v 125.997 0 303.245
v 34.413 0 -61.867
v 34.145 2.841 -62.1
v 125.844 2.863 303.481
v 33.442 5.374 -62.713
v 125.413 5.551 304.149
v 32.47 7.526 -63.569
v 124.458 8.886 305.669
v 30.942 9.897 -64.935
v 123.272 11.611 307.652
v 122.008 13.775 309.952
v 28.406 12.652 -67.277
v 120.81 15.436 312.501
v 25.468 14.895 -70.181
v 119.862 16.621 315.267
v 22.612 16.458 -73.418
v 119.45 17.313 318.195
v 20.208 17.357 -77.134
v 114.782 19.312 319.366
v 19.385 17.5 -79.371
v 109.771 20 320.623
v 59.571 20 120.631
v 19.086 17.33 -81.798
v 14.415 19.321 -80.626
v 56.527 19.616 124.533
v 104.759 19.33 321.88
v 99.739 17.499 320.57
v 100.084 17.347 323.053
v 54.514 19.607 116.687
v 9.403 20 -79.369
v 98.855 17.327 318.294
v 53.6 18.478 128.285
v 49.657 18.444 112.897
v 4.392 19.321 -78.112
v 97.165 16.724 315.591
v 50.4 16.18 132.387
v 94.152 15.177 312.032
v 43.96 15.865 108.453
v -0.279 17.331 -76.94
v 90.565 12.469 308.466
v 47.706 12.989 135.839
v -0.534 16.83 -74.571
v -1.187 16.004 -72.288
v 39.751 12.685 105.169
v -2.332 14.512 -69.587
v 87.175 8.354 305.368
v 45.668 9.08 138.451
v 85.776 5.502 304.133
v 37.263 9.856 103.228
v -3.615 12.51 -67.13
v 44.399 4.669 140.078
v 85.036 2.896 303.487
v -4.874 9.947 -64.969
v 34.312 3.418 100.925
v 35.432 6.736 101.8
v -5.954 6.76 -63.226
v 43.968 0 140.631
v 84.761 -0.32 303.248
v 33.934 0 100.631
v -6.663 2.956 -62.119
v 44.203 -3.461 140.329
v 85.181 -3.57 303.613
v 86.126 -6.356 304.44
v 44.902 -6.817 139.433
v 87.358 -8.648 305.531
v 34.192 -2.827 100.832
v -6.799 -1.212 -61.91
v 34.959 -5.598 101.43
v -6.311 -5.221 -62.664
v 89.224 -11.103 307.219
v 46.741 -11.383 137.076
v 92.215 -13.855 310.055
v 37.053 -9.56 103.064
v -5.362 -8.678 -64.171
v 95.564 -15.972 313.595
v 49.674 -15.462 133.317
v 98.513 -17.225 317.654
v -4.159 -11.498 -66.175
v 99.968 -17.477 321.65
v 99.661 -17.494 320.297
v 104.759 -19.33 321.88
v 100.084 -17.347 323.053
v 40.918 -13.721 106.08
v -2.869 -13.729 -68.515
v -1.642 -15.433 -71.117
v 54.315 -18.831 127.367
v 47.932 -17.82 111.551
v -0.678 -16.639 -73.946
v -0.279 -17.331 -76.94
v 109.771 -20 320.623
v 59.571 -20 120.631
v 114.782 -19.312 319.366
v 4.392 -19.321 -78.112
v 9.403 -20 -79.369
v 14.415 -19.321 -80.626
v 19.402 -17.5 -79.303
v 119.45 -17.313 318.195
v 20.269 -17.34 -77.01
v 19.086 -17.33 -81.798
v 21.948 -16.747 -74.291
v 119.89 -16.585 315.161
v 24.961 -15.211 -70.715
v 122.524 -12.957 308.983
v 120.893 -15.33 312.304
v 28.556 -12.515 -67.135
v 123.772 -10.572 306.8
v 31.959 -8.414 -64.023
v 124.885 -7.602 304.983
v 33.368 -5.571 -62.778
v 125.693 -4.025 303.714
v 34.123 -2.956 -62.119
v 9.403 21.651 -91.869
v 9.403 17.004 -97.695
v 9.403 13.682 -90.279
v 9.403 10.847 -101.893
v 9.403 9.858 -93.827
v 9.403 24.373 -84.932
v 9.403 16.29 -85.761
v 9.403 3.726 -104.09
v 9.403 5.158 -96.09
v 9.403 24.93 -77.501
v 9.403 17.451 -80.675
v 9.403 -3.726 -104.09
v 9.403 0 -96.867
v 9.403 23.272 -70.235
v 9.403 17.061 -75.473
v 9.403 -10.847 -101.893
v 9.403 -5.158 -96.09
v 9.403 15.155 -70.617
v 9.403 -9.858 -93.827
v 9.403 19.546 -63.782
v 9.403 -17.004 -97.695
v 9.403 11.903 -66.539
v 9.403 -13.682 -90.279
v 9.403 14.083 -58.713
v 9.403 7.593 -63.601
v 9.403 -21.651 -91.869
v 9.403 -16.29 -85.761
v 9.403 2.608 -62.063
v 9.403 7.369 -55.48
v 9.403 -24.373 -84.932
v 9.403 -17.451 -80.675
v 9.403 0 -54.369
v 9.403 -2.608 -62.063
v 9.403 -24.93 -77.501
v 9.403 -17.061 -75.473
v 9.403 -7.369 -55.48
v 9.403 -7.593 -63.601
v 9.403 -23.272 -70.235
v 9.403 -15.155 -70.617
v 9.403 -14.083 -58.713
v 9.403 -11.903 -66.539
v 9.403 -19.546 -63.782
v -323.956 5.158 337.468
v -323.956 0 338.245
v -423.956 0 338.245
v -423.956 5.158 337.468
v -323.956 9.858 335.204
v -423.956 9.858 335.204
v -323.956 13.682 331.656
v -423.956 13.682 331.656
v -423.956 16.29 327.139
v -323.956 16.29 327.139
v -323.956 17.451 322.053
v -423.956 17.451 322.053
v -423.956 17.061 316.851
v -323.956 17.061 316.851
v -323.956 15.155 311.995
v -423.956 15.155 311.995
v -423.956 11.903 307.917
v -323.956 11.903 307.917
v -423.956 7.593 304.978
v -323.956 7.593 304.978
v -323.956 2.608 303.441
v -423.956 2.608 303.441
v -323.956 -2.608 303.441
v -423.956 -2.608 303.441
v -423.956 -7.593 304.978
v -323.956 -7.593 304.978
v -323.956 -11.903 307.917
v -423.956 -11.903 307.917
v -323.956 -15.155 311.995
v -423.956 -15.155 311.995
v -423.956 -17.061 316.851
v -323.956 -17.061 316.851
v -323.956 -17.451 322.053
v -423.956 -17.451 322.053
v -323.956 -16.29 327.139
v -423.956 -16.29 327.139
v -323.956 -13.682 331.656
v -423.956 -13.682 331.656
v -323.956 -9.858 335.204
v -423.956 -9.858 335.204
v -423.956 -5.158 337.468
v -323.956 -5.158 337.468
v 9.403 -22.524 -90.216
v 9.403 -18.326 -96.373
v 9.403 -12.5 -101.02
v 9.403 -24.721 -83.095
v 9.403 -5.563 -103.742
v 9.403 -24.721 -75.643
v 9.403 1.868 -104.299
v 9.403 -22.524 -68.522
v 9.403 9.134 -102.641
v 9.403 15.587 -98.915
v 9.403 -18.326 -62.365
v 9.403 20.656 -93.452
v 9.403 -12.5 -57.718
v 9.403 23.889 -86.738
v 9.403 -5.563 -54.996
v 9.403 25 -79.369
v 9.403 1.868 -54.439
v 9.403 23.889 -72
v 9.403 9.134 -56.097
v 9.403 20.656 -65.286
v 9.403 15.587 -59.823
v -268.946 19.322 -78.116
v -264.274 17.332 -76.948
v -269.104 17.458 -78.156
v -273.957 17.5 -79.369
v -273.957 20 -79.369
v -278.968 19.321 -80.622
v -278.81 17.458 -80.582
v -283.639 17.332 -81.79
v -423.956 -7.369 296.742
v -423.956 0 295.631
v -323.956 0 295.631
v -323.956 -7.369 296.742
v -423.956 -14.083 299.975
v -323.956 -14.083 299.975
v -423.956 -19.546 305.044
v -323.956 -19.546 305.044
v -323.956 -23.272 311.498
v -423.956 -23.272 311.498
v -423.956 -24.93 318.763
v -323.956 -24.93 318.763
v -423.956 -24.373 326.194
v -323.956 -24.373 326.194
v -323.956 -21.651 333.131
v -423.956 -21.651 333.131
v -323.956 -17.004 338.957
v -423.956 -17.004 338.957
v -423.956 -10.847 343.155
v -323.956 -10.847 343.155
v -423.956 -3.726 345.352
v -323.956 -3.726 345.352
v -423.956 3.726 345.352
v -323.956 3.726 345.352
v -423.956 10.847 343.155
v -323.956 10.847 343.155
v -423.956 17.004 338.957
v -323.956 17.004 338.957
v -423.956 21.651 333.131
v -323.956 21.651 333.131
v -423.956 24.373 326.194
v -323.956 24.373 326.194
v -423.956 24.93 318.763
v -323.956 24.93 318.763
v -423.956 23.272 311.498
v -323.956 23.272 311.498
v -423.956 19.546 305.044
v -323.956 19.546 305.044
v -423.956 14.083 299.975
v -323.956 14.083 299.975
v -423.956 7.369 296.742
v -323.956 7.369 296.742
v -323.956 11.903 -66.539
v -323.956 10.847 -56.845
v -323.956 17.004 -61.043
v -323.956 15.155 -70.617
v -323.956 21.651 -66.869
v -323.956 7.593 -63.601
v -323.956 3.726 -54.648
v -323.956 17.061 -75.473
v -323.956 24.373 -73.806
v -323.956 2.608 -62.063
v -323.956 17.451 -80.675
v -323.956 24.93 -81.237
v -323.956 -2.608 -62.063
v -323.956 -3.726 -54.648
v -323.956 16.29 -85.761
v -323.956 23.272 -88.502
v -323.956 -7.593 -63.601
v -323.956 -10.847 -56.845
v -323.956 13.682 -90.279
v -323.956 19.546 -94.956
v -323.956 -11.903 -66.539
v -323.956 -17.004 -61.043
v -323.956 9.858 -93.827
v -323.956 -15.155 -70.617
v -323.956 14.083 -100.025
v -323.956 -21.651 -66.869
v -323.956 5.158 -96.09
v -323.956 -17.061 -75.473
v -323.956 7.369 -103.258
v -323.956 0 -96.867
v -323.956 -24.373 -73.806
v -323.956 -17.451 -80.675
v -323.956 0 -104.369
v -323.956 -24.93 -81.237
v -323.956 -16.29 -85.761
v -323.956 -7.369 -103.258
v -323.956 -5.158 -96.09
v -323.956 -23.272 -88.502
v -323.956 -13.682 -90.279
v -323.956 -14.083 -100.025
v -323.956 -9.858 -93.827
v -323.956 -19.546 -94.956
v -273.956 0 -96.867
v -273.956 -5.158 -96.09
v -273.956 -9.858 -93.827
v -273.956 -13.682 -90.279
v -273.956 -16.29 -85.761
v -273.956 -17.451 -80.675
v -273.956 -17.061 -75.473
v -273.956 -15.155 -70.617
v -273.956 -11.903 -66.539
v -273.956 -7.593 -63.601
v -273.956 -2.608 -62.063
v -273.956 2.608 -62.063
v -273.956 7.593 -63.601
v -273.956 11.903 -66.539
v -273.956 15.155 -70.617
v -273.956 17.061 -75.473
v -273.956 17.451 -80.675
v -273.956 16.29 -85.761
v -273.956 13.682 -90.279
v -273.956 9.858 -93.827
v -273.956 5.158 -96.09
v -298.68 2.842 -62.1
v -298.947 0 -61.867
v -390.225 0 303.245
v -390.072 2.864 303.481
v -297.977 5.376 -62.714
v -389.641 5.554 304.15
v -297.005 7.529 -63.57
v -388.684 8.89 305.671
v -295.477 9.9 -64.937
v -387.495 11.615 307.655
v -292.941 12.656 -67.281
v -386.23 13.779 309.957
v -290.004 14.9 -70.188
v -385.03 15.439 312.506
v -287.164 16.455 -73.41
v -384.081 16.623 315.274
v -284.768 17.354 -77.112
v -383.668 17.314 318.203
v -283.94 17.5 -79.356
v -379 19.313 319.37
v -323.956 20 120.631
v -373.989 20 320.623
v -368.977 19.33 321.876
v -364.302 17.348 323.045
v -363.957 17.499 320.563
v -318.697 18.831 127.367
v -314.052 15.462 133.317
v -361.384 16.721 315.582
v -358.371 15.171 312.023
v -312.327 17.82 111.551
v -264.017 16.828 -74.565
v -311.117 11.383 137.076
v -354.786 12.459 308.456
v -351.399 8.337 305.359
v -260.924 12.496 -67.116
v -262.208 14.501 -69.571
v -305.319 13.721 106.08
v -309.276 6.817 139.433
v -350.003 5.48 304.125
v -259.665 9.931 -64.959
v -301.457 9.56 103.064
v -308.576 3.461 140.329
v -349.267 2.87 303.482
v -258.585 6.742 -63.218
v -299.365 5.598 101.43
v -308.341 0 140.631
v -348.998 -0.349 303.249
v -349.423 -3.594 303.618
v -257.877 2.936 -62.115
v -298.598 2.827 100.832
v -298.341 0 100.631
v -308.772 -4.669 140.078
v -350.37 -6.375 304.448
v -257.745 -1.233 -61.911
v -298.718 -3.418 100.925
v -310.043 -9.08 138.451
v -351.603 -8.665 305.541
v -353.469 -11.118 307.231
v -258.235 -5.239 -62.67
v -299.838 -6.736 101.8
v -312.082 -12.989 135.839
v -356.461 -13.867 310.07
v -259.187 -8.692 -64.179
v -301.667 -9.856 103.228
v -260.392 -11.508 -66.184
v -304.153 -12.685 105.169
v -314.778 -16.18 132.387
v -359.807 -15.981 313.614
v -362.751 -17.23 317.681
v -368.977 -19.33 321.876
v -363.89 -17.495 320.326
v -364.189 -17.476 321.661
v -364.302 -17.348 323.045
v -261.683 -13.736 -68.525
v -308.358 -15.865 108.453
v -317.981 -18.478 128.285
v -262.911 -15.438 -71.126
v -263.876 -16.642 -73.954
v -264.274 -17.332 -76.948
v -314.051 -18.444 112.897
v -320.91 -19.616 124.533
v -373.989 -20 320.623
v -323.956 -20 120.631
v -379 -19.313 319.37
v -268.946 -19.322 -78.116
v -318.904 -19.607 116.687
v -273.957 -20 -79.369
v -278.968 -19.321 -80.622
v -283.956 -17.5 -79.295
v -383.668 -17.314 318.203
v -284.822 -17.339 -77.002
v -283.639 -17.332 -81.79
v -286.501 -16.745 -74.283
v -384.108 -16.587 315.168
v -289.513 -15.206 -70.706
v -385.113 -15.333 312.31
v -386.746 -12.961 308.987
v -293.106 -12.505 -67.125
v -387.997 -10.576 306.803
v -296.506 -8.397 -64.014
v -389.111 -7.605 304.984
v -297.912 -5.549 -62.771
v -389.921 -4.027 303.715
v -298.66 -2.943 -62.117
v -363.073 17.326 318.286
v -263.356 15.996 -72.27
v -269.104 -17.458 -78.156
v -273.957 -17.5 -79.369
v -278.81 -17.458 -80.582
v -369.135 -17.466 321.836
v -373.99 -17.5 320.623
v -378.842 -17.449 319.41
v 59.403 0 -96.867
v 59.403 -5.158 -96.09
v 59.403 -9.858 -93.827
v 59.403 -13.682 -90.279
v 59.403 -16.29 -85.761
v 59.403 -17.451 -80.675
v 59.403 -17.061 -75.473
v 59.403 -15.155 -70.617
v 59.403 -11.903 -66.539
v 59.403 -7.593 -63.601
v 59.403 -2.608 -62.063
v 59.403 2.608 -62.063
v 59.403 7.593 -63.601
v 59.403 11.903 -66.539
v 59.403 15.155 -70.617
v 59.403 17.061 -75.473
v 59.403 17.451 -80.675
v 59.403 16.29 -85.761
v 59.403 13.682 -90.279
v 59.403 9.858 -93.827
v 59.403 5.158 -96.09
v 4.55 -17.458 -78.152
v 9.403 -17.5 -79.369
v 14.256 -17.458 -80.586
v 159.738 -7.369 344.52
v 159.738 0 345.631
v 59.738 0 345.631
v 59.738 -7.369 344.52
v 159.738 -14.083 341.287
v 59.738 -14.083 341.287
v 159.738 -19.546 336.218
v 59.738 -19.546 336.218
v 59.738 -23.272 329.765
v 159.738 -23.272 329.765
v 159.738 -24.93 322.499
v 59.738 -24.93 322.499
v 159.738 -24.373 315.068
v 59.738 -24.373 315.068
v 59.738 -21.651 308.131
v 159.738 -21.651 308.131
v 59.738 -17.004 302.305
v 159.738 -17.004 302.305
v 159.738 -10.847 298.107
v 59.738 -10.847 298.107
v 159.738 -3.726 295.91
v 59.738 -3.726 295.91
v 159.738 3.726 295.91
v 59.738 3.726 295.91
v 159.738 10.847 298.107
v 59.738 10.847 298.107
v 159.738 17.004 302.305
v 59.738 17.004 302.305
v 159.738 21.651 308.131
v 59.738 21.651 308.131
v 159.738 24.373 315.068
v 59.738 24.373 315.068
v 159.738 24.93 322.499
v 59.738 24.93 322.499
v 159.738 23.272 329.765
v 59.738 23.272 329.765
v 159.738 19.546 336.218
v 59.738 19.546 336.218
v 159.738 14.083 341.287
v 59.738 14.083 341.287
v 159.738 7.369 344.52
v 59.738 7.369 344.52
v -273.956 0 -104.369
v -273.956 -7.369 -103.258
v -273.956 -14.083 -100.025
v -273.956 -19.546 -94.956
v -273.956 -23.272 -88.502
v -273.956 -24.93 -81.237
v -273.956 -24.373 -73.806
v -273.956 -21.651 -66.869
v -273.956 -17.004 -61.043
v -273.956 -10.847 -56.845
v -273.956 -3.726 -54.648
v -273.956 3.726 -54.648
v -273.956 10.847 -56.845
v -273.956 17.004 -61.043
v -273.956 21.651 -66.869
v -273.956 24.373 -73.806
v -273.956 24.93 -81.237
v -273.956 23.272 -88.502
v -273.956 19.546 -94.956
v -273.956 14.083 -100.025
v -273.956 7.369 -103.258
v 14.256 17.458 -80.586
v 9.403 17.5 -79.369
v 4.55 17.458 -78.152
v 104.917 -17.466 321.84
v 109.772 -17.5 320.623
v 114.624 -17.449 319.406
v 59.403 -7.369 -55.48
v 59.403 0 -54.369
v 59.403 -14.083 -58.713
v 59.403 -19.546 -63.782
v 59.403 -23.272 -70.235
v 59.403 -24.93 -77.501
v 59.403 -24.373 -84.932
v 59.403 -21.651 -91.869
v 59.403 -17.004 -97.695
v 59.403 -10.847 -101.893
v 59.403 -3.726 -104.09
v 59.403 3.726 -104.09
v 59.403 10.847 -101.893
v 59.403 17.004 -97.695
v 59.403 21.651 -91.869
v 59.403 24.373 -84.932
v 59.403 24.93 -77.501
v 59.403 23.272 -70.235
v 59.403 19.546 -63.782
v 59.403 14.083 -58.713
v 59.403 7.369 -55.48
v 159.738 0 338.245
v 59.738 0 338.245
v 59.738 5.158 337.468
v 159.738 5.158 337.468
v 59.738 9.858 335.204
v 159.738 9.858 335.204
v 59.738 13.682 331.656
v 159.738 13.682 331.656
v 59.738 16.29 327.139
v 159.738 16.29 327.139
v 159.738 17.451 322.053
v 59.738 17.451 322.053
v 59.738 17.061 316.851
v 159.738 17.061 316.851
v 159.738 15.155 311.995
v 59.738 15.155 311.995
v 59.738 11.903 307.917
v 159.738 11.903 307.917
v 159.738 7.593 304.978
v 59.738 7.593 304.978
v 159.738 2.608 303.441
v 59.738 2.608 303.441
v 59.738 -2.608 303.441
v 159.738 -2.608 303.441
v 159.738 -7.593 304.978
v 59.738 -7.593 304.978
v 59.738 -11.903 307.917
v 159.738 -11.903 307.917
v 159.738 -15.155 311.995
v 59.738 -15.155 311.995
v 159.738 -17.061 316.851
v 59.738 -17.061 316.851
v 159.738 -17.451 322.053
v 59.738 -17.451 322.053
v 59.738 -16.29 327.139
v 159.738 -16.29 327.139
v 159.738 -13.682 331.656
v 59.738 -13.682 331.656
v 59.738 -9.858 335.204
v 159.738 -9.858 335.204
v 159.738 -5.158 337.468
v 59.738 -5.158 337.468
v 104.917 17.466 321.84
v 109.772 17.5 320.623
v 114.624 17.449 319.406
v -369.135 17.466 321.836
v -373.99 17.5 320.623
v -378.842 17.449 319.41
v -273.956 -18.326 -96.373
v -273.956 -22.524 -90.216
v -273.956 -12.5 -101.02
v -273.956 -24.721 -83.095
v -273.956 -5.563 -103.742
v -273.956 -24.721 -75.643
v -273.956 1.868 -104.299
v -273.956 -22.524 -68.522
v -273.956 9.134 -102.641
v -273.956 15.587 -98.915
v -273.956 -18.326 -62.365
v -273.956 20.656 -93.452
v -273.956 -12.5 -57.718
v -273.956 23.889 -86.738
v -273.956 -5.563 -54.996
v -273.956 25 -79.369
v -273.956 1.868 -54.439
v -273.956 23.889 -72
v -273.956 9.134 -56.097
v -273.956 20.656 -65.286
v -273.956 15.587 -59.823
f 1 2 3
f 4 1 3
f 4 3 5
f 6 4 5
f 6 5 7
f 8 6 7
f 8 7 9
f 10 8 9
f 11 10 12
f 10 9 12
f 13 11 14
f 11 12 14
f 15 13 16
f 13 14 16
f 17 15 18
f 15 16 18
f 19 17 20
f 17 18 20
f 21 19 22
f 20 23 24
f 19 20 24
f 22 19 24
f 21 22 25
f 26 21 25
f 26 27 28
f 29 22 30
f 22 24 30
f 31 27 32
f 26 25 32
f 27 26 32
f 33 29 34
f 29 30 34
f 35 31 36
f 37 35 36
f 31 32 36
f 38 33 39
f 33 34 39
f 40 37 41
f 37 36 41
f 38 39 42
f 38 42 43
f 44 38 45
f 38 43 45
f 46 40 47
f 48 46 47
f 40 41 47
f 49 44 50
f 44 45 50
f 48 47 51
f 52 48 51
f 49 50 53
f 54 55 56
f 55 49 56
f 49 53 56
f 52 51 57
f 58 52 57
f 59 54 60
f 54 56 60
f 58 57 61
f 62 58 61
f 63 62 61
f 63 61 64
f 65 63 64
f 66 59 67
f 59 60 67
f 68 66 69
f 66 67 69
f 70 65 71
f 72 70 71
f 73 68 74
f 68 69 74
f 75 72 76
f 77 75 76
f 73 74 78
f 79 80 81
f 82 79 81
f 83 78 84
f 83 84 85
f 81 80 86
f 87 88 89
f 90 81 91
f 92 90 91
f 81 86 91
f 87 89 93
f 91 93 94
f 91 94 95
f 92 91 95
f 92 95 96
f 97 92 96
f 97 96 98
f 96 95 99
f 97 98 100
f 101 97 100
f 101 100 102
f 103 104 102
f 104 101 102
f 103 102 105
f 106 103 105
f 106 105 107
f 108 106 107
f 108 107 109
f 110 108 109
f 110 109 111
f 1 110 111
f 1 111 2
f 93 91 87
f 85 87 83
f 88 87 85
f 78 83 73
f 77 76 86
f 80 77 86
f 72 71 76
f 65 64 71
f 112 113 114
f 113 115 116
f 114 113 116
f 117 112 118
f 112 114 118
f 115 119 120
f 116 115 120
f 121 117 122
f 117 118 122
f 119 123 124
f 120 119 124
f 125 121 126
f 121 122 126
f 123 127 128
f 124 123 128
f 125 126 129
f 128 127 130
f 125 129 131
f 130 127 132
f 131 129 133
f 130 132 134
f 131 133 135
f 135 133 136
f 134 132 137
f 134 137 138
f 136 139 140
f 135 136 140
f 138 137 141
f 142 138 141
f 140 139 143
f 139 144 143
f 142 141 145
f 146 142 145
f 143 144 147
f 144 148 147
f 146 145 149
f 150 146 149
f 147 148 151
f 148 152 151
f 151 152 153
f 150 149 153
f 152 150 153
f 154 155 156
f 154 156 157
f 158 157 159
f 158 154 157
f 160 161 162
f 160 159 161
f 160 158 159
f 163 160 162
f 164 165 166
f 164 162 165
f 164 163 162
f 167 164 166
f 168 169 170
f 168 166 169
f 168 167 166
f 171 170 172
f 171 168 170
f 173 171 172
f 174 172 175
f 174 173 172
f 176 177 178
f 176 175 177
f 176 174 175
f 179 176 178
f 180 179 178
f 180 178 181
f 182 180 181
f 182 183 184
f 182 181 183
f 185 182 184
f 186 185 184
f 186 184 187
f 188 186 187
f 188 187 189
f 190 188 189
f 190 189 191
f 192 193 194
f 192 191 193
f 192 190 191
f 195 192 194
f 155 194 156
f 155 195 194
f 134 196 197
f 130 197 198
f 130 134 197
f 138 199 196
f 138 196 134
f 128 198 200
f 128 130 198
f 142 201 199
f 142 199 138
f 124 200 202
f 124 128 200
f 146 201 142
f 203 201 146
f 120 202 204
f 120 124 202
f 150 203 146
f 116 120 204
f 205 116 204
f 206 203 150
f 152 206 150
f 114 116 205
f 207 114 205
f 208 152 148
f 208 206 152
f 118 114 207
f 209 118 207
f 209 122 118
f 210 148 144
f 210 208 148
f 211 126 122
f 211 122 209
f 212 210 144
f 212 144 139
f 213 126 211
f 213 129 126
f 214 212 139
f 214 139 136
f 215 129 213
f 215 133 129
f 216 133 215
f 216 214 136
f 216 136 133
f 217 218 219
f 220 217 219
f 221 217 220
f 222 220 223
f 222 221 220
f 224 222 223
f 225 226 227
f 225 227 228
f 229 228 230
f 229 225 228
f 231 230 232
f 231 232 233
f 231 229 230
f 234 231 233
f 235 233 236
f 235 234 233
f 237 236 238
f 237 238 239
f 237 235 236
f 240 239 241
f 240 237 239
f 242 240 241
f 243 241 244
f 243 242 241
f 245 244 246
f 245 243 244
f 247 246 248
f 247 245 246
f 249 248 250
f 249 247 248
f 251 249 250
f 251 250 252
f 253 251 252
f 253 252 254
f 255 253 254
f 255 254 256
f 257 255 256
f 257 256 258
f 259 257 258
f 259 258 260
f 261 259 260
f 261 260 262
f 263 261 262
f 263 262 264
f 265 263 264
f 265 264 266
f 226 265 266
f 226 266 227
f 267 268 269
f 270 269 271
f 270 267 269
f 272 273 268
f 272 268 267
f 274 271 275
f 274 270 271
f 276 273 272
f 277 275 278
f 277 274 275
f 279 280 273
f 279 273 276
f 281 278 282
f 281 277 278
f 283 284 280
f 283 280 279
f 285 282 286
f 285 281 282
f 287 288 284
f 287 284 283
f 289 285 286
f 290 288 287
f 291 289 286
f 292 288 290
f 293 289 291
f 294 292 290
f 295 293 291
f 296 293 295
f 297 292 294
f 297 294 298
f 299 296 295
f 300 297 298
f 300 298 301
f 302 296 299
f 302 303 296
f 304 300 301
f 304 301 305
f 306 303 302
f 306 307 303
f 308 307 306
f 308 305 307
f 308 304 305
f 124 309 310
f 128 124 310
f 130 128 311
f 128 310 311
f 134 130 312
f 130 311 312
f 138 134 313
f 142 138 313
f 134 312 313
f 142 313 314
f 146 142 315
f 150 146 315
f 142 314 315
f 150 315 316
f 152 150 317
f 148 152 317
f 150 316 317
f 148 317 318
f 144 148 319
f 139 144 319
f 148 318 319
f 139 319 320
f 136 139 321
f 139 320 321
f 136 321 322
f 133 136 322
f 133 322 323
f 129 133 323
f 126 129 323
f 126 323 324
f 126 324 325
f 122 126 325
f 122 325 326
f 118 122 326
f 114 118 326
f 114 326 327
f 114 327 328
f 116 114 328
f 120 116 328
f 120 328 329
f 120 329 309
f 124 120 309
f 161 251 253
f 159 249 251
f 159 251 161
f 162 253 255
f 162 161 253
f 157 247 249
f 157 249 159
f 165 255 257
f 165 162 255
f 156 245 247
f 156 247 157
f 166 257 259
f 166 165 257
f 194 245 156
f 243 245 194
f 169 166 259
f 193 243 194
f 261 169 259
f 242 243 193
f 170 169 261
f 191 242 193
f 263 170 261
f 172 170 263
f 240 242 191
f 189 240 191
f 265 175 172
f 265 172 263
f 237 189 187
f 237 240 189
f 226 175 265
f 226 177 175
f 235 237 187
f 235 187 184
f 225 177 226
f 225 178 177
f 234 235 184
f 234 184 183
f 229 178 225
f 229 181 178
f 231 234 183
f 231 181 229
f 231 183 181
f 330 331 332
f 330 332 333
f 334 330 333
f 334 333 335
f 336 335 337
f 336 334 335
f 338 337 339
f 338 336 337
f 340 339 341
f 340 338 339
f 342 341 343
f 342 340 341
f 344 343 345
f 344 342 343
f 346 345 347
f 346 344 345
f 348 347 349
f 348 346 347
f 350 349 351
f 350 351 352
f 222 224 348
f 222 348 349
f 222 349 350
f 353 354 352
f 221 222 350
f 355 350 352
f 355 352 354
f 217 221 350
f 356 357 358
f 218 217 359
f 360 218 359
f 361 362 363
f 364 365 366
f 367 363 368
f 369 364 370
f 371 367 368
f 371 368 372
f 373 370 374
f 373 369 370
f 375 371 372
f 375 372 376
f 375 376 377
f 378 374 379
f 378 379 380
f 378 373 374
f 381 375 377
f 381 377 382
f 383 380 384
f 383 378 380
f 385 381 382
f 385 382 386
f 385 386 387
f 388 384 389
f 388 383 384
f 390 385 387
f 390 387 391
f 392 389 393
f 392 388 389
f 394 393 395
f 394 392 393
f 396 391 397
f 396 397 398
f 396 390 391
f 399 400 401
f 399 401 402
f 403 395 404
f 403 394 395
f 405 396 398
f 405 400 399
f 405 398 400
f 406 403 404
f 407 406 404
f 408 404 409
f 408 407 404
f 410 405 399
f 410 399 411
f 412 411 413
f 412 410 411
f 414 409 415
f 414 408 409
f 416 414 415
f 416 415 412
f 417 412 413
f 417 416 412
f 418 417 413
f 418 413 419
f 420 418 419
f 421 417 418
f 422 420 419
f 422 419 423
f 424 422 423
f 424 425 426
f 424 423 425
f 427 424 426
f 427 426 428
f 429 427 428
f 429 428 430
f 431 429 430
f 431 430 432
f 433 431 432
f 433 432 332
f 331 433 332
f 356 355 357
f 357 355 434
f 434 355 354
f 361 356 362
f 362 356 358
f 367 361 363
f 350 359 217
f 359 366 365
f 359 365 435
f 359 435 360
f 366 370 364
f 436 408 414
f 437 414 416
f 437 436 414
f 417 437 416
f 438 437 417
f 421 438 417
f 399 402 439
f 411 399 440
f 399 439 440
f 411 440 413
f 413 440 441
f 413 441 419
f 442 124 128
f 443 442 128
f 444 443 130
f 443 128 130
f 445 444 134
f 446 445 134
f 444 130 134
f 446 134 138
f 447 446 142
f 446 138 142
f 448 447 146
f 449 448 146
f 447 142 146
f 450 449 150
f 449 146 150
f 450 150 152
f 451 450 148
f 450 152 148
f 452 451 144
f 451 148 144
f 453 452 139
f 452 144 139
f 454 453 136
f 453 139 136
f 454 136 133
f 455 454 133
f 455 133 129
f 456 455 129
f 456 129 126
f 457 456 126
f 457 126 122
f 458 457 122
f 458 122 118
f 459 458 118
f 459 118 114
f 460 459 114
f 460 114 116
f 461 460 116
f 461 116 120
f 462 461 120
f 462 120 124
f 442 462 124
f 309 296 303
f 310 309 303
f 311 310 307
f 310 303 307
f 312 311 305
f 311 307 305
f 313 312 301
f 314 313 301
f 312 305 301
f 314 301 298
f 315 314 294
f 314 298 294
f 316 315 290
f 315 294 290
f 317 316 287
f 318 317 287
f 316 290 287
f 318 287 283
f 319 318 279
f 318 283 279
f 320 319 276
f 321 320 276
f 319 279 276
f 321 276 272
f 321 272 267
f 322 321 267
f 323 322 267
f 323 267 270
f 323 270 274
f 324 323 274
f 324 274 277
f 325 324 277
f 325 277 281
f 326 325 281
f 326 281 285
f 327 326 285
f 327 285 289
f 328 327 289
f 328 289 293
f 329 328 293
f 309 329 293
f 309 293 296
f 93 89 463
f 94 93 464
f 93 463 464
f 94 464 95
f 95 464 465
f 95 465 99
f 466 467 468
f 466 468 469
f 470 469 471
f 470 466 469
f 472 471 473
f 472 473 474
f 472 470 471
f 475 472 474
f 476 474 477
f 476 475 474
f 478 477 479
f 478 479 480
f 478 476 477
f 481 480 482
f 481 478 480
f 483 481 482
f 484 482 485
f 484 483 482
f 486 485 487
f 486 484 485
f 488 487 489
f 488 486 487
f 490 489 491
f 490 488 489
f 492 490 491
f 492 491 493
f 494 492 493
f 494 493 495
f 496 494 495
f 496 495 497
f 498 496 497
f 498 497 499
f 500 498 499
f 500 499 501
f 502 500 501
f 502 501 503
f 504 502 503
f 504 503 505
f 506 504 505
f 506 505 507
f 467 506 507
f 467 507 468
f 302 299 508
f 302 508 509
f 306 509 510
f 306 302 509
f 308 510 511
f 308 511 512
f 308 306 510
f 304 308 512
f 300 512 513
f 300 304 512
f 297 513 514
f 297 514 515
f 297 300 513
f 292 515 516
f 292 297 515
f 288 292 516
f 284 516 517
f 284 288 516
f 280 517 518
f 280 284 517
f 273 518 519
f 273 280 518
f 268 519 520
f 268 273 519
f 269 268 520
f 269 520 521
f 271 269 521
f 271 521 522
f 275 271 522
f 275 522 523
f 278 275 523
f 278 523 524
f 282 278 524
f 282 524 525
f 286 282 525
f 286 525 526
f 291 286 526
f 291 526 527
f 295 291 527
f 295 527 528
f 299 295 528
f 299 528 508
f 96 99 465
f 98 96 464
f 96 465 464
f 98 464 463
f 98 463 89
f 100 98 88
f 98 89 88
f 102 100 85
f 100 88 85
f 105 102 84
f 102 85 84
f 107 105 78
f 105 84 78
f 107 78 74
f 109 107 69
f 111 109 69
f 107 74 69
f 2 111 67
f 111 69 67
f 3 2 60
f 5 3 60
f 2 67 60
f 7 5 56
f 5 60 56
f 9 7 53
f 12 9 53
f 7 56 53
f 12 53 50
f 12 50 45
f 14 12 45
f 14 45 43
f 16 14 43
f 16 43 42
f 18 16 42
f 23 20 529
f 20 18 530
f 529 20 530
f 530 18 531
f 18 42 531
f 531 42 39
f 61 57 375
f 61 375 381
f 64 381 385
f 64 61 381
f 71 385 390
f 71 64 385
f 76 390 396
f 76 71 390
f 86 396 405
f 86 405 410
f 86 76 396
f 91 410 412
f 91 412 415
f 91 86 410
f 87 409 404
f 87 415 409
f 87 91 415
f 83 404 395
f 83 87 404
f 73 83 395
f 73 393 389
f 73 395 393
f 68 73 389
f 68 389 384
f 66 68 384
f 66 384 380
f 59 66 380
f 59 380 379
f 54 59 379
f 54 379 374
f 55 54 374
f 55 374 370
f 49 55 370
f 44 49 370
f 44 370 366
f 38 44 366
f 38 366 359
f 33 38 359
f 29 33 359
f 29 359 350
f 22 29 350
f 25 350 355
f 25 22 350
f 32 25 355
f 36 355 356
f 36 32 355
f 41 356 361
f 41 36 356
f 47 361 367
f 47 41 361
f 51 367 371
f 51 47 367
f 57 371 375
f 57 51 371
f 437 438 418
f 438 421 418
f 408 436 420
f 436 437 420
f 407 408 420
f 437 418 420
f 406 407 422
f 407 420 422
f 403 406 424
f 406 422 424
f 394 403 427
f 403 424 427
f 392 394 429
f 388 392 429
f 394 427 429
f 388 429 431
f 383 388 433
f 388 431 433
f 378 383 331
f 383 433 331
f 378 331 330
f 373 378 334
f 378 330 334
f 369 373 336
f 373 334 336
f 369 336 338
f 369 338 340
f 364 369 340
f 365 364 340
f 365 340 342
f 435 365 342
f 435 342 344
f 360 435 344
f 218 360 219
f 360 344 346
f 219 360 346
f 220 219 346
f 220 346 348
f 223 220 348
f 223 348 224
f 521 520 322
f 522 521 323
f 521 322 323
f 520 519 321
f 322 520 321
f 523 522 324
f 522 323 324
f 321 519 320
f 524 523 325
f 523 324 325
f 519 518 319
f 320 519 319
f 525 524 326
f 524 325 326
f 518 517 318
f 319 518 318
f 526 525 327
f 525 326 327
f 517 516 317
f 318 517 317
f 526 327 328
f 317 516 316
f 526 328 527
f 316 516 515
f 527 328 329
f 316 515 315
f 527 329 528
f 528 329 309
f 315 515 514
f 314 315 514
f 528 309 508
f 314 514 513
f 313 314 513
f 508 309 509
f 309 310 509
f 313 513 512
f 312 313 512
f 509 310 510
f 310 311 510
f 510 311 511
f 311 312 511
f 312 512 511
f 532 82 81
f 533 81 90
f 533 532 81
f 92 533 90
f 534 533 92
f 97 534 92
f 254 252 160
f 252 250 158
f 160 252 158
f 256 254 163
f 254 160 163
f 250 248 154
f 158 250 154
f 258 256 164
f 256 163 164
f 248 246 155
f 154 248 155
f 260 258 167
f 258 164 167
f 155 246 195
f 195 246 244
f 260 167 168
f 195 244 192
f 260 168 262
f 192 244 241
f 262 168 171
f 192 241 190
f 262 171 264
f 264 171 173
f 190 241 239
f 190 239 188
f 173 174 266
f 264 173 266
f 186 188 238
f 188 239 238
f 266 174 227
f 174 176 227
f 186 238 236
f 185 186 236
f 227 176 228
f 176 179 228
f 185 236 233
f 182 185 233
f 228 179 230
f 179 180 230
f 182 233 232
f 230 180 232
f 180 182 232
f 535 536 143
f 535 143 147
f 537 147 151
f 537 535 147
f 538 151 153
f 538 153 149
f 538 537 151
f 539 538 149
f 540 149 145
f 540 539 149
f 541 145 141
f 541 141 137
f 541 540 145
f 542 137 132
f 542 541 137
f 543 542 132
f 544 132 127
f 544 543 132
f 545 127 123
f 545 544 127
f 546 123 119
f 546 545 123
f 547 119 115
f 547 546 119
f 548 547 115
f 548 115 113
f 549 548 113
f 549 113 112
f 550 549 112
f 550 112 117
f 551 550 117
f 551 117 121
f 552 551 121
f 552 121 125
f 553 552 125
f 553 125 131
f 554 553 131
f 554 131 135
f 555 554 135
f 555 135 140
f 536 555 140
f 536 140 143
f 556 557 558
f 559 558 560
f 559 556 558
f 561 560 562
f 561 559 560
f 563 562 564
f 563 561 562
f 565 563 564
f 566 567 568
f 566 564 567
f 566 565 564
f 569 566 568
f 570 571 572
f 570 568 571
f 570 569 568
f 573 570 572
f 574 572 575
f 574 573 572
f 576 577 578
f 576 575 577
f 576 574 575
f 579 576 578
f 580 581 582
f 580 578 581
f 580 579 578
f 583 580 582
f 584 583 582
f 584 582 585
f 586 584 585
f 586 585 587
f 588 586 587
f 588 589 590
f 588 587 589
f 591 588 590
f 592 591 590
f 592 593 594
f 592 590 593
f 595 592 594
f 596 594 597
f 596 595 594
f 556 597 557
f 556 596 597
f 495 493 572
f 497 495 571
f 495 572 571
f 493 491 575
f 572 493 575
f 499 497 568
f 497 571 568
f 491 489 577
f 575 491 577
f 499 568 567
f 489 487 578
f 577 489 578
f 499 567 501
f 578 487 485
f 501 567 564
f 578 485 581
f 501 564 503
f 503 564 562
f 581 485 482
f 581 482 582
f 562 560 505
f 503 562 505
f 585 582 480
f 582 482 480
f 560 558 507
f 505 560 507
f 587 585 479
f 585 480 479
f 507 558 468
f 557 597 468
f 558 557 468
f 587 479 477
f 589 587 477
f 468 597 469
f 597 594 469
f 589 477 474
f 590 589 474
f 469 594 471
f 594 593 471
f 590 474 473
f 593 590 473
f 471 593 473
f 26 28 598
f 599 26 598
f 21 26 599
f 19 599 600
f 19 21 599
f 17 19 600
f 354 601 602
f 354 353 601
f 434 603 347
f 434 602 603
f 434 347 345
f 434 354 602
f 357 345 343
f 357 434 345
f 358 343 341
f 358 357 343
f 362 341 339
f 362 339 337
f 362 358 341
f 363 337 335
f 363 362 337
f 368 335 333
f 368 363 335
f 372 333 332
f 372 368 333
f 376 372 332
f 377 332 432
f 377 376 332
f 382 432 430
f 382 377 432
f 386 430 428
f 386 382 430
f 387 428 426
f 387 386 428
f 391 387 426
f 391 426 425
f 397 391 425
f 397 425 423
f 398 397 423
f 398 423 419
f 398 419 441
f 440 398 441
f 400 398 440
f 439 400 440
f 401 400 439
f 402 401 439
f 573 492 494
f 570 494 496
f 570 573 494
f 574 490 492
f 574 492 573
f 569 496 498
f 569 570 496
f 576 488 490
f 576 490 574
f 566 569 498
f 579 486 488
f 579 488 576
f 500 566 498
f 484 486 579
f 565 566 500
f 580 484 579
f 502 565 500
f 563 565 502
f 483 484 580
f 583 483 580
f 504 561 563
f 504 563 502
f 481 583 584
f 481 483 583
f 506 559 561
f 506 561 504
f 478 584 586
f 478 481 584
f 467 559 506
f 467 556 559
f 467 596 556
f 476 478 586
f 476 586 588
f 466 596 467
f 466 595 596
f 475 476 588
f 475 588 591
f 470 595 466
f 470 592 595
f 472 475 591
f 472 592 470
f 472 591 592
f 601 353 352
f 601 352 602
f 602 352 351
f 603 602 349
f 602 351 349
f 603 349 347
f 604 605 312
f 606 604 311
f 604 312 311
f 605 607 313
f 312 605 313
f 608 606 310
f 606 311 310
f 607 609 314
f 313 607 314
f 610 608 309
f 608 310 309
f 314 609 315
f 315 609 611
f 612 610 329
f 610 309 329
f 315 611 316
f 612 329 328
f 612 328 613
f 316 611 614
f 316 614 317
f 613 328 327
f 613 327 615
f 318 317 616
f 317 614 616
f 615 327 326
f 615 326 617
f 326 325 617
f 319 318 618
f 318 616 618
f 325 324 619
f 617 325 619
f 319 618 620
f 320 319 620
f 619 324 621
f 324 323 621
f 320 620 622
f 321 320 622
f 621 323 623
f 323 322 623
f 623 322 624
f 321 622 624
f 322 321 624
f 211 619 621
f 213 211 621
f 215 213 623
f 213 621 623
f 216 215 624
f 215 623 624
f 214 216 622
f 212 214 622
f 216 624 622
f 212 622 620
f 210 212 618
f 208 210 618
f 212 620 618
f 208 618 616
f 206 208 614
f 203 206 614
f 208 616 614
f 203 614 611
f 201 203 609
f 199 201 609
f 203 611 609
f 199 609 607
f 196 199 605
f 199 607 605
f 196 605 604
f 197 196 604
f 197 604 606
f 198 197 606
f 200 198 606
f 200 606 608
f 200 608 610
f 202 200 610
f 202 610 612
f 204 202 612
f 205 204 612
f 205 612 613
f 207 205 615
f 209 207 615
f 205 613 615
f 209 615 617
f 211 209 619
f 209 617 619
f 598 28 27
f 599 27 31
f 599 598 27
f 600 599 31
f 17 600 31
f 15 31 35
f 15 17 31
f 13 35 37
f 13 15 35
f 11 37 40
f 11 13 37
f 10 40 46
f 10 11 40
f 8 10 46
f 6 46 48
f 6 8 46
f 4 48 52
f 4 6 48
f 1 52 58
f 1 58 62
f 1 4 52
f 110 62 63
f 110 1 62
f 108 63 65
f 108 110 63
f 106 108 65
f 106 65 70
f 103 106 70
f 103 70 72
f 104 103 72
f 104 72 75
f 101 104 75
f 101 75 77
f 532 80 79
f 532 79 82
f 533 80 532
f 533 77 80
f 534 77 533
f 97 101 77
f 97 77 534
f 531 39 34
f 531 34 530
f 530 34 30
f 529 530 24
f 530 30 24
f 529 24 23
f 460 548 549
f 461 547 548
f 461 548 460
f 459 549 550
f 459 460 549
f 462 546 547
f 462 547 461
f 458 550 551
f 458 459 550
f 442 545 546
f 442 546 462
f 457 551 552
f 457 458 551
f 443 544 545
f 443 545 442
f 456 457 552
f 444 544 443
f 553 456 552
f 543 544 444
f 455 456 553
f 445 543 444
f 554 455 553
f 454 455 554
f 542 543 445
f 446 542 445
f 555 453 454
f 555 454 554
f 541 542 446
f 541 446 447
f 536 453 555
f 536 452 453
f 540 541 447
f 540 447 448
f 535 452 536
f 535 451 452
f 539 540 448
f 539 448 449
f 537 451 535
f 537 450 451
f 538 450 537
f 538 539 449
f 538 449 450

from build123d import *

# Parameters (mm, degrees)
SWEEP1_PROFILE_R        = 20
SWEEP2_START            = -74.696203031
SWEEP2_OUTLINE_R        = 20
SWEEP2_DEPTH            = 412.392012033
SWEEP3_PROFILE_R        = 20
SWEEP4_PROFILE_R        = 25
SWEEP5_PROFILE_R        = 25
SWEEP6_START            = -273.956371512
SWEEP6_OUTLINE_R        = 25
SWEEP6_DEPTH            = 283.359378358
SWEEP7_PROFILE_R        = 25
SWEEP8_PROFILE_R        = 25
CUT_EXTRUDE1_DEPTH      = 10
CUT_EXTRUDE1_DEPTH_BACK = 583.694674
SKETCH110_R             = 17.5
SKETCH127_R             = 17.5
CUT_EXTRUDE2_DEPTH      = 510


# Read off the part's stored shape, not the designer's step: Sweep2, Sweep6
with BuildPart() as part:
    # Sweep1: sweep along a path in Lower wishbone
    with BuildLine(Plane(origin=(0, 0, 0), x_dir=(1, 0, 0), z_dir=(0, 1, 0))) as sweep1_path:
        Line((-373.956371512, -320.631072668), (-273.956371512, 79.368927332))
    # Sweep1 profile (on start of the path) → Sweep1 (sweep)
    with BuildSketch(Plane(origin=(-373.956371512, 0, 320.631072668), x_dir=(-0.9701425001453319, 0, -0.2425356250363329), z_dir=(0.2425356250363329, 0, -0.9701425001453319))):
        Circle(SWEEP1_PROFILE_R)
    sweep(path=sweep1_path.line)



with BuildPart() as body_2:
    # Sweep2 outline → Sweep2 (new body)
    with BuildSketch(Plane(origin=(0, 0, 0), x_dir=(0.9699508921808406, 0, -0.24330077426426597), z_dir=(0.24330077426426594, 0, 0.9699508921808407)).offset(SWEEP2_START)):
        with Locations((28.430976352, 0)):
            Circle(SWEEP2_OUTLINE_R)
    extrude(amount=SWEEP2_DEPTH)


with BuildPart() as part_1:
    add(part.part)

    add(body_2.part)  # Sweep3 merges body 2
    # Sweep3: sweep along a path in Lower wishbone<7>
    with BuildLine(Plane(origin=(0, 0, 0), x_dir=(1, 0, 0), z_dir=(0, 1, 0))) as sweep3_path:
        Line((-323.956371512, -120.631072668), (59.57065476, -120.631072668))
    # Sweep3 profile (on start of the path) → Sweep3 (sweep)
    with BuildSketch(Plane(origin=(-323.956371512, 0, 120.631072668), x_dir=(0, 0, 1), z_dir=(1, 0, 0))):
        Circle(SWEEP3_PROFILE_R)
    sweep(path=sweep3_path.line)


with BuildPart() as body_2_2:
    # Sweep4: sweep along a path in Lower wishbone<8>
    with BuildLine(Plane(origin=(0, 0, 0), x_dir=(1, 0, 0), z_dir=(0, 1, 0))) as sweep4_path:
        Line((59.738302674, -320.631072668), (159.738302674, -320.631072668))
    # Sweep4 profile (on start of the path) → Sweep4 (sweep)
    with BuildSketch(Plane(origin=(59.738302674, 0, 320.631072668), x_dir=(0, 0, 1), z_dir=(1, 0, 0))):
        Circle(SWEEP4_PROFILE_R)
    sweep(path=sweep4_path.line)


with BuildPart() as body_3:
    # Sweep5: sweep along a path in Lower wishbone<9>
    with BuildLine(Plane(origin=(0, 0, 0), x_dir=(1, 0, 0), z_dir=(0, 1, 0))) as sweep5_path:
        Line((-323.956371512, -320.631072668), (-423.956371512, -320.631072668))
    # Sweep5 profile (on start of the path) → Sweep5 (sweep)
    with BuildSketch(Plane(origin=(-323.956371512, 0, 320.631072668), x_dir=(0, 0, -1), z_dir=(-1, 0, 0))):
        Circle(SWEEP5_PROFILE_R)
    sweep(path=sweep5_path.line)


with BuildPart() as body_4:
    # Sweep6 outline → Sweep6 (new body)
    with BuildSketch(Plane.YZ.offset(SWEEP6_START)):
        with Locations((0, -79.368927332)):
            Circle(SWEEP6_OUTLINE_R)
    extrude(amount=SWEEP6_DEPTH)


with BuildPart() as body_5:
    # Sweep7: sweep along a path in Lower wishbone<11>
    with BuildLine(Plane(origin=(0, 0, 0), x_dir=(1, 0, 0), z_dir=(0, 1, 0))) as sweep7_path:
        Line((-273.956371512, 79.368927332), (-323.956371512, 79.368927332))
    # Sweep7 profile (on start of the path) → Sweep7 (sweep)
    with BuildSketch(Plane(origin=(-273.956371512, 0, -79.368927332), x_dir=(0, 0, -1), z_dir=(-1, 0, 0))):
        Circle(SWEEP7_PROFILE_R)
    sweep(path=sweep7_path.line)


with BuildPart() as body_6:
    # Sweep8: sweep along a path in Lower wishbone<12>
    with BuildLine(Plane(origin=(0, 0, 0), x_dir=(1, 0, 0), z_dir=(0, 1, 0))) as sweep8_path:
        Line((9.403006846, 79.368927332), (59.403006846, 79.368927332))
    # Sweep8 profile (on start of the path) → Sweep8 (sweep)
    with BuildSketch(Plane(origin=(9.403006846, 0, -79.368927332), x_dir=(0, 0, 1), z_dir=(1, 0, 0))):
        Circle(SWEEP8_PROFILE_R)
    sweep(path=sweep8_path.line)


with BuildPart() as cut_extrude1_tool:
    # Sketch110 → Cut-Extrude1 (new, two sides: drawn at the far end of the back side and taken through both)
    with BuildSketch(Plane.ZY.offset(423.956371512).offset(-CUT_EXTRUDE1_DEPTH_BACK)):
        with Locations((320.745233447, 0)):
            Circle(SKETCH110_R)
    extrude(amount=CUT_EXTRUDE1_DEPTH + CUT_EXTRUDE1_DEPTH_BACK)


with BuildPart() as part_2:
    add(part_1.part)

    # Cut-Extrude1: cut by cut_extrude1_tool
    add(cut_extrude1_tool.part, mode=Mode.SUBTRACT)


with BuildPart() as body_2_2_1:
    add(body_2_2.part)

    # Cut-Extrude1: cut by cut_extrude1_tool
    add(cut_extrude1_tool.part, mode=Mode.SUBTRACT)


with BuildPart() as body_3_1:
    add(body_3.part)

    # Cut-Extrude1: cut by cut_extrude1_tool
    add(cut_extrude1_tool.part, mode=Mode.SUBTRACT)


with BuildPart() as cut_extrude2_tool:
    # Sketch127 → Cut-Extrude2 (new body)
    with BuildSketch(Plane.ZY.offset(323.956371512)):
        with Locations(Location((-79.367471676, 0, 0), (0, 0, 180))):
            Circle(SKETCH127_R)
    extrude(amount=-CUT_EXTRUDE2_DEPTH)


with BuildPart() as part_3:
    add(part_2.part)

    # Cut-Extrude2: cut by cut_extrude2_tool
    add(cut_extrude2_tool.part, mode=Mode.SUBTRACT)


with BuildPart() as body_4_1:
    add(body_4.part)

    # Cut-Extrude2: cut by cut_extrude2_tool
    add(cut_extrude2_tool.part, mode=Mode.SUBTRACT)


with BuildPart() as body_5_1:
    add(body_5.part)

    # Cut-Extrude2: cut by cut_extrude2_tool
    add(cut_extrude2_tool.part, mode=Mode.SUBTRACT)


with BuildPart() as body_6_1:
    add(body_6.part)

    # Cut-Extrude2: cut by cut_extrude2_tool
    add(cut_extrude2_tool.part, mode=Mode.SUBTRACT)


solid = Compound([body_2_2_1.part, body_3_1.part, part_3.part, body_4_1.part, body_5_1.part, body_6_1.part])
